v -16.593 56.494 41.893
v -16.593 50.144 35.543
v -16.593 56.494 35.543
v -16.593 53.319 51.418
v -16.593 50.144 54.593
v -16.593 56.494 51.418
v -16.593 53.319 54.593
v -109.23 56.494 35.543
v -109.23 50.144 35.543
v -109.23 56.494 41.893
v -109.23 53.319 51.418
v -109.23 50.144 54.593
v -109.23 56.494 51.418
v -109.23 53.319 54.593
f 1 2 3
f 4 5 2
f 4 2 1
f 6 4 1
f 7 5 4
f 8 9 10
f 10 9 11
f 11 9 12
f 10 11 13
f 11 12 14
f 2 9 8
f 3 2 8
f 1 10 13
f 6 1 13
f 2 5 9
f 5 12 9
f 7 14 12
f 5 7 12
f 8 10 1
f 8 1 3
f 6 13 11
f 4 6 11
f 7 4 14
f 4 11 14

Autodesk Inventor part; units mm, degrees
ref_plane "YZ Plane" through (0, 0, 0) normal (1, 0, 0) x (0, 1, 0)
ref_plane "XZ Plane" through (0, 0, 0) normal (0, 1, 0) x (-1, 0, 0)
ref_plane "Work Plane1" through (-109.2301, 56.494, 41.8932) normal (1, 0, 0) x (0, 1, 0)
sketch "Sketch1" plane through (-109.2301, 56.494, 41.8932) normal (1, 0, 0) x (0, 1, 0)
  line L0 (6.35, 0) -> (6.35, -6.35) projected
  line L1 (6.35, 0) -> (0, 0) projected
  line L2 (0, 0) -> (0, 9.525) projected
  line L3 (0, 9.525) -> (-3.175, 9.525) projected
  line L4 (-3.175, 9.525) -> (-3.175, 12.7) projected
  line L5 (-3.175, 12.7) -> (-6.35, 12.7) projected
  line L6 (-6.35, 12.7) -> (-6.35, -6.35) projected
  line L7 (-6.35, -6.35) -> (6.35, -6.35) projected
  line L8 (0, -6.35) -> (76.8547, -6.35) projected
  line L9 (76.8547, 0) -> (76.8547, -6.35) projected
  line L10 (76.8547, 0) -> (0, 0) projected
  line L11 (0, 0) -> (0, -6.35) projected
  point P0 (-56.494, -41.8932)
ref_plane "Work Plane2" through (-16.5927, 50.144, 35.5432) normal (-1, 0, 0) x (0, 0, 1)
extrude "Extrusion1" add sketch "Sketch1" along normal up to surface (92.6375 mm away) contours L11 L7 L6 L5 L4 L3 L2
properties part number "New Bot"
